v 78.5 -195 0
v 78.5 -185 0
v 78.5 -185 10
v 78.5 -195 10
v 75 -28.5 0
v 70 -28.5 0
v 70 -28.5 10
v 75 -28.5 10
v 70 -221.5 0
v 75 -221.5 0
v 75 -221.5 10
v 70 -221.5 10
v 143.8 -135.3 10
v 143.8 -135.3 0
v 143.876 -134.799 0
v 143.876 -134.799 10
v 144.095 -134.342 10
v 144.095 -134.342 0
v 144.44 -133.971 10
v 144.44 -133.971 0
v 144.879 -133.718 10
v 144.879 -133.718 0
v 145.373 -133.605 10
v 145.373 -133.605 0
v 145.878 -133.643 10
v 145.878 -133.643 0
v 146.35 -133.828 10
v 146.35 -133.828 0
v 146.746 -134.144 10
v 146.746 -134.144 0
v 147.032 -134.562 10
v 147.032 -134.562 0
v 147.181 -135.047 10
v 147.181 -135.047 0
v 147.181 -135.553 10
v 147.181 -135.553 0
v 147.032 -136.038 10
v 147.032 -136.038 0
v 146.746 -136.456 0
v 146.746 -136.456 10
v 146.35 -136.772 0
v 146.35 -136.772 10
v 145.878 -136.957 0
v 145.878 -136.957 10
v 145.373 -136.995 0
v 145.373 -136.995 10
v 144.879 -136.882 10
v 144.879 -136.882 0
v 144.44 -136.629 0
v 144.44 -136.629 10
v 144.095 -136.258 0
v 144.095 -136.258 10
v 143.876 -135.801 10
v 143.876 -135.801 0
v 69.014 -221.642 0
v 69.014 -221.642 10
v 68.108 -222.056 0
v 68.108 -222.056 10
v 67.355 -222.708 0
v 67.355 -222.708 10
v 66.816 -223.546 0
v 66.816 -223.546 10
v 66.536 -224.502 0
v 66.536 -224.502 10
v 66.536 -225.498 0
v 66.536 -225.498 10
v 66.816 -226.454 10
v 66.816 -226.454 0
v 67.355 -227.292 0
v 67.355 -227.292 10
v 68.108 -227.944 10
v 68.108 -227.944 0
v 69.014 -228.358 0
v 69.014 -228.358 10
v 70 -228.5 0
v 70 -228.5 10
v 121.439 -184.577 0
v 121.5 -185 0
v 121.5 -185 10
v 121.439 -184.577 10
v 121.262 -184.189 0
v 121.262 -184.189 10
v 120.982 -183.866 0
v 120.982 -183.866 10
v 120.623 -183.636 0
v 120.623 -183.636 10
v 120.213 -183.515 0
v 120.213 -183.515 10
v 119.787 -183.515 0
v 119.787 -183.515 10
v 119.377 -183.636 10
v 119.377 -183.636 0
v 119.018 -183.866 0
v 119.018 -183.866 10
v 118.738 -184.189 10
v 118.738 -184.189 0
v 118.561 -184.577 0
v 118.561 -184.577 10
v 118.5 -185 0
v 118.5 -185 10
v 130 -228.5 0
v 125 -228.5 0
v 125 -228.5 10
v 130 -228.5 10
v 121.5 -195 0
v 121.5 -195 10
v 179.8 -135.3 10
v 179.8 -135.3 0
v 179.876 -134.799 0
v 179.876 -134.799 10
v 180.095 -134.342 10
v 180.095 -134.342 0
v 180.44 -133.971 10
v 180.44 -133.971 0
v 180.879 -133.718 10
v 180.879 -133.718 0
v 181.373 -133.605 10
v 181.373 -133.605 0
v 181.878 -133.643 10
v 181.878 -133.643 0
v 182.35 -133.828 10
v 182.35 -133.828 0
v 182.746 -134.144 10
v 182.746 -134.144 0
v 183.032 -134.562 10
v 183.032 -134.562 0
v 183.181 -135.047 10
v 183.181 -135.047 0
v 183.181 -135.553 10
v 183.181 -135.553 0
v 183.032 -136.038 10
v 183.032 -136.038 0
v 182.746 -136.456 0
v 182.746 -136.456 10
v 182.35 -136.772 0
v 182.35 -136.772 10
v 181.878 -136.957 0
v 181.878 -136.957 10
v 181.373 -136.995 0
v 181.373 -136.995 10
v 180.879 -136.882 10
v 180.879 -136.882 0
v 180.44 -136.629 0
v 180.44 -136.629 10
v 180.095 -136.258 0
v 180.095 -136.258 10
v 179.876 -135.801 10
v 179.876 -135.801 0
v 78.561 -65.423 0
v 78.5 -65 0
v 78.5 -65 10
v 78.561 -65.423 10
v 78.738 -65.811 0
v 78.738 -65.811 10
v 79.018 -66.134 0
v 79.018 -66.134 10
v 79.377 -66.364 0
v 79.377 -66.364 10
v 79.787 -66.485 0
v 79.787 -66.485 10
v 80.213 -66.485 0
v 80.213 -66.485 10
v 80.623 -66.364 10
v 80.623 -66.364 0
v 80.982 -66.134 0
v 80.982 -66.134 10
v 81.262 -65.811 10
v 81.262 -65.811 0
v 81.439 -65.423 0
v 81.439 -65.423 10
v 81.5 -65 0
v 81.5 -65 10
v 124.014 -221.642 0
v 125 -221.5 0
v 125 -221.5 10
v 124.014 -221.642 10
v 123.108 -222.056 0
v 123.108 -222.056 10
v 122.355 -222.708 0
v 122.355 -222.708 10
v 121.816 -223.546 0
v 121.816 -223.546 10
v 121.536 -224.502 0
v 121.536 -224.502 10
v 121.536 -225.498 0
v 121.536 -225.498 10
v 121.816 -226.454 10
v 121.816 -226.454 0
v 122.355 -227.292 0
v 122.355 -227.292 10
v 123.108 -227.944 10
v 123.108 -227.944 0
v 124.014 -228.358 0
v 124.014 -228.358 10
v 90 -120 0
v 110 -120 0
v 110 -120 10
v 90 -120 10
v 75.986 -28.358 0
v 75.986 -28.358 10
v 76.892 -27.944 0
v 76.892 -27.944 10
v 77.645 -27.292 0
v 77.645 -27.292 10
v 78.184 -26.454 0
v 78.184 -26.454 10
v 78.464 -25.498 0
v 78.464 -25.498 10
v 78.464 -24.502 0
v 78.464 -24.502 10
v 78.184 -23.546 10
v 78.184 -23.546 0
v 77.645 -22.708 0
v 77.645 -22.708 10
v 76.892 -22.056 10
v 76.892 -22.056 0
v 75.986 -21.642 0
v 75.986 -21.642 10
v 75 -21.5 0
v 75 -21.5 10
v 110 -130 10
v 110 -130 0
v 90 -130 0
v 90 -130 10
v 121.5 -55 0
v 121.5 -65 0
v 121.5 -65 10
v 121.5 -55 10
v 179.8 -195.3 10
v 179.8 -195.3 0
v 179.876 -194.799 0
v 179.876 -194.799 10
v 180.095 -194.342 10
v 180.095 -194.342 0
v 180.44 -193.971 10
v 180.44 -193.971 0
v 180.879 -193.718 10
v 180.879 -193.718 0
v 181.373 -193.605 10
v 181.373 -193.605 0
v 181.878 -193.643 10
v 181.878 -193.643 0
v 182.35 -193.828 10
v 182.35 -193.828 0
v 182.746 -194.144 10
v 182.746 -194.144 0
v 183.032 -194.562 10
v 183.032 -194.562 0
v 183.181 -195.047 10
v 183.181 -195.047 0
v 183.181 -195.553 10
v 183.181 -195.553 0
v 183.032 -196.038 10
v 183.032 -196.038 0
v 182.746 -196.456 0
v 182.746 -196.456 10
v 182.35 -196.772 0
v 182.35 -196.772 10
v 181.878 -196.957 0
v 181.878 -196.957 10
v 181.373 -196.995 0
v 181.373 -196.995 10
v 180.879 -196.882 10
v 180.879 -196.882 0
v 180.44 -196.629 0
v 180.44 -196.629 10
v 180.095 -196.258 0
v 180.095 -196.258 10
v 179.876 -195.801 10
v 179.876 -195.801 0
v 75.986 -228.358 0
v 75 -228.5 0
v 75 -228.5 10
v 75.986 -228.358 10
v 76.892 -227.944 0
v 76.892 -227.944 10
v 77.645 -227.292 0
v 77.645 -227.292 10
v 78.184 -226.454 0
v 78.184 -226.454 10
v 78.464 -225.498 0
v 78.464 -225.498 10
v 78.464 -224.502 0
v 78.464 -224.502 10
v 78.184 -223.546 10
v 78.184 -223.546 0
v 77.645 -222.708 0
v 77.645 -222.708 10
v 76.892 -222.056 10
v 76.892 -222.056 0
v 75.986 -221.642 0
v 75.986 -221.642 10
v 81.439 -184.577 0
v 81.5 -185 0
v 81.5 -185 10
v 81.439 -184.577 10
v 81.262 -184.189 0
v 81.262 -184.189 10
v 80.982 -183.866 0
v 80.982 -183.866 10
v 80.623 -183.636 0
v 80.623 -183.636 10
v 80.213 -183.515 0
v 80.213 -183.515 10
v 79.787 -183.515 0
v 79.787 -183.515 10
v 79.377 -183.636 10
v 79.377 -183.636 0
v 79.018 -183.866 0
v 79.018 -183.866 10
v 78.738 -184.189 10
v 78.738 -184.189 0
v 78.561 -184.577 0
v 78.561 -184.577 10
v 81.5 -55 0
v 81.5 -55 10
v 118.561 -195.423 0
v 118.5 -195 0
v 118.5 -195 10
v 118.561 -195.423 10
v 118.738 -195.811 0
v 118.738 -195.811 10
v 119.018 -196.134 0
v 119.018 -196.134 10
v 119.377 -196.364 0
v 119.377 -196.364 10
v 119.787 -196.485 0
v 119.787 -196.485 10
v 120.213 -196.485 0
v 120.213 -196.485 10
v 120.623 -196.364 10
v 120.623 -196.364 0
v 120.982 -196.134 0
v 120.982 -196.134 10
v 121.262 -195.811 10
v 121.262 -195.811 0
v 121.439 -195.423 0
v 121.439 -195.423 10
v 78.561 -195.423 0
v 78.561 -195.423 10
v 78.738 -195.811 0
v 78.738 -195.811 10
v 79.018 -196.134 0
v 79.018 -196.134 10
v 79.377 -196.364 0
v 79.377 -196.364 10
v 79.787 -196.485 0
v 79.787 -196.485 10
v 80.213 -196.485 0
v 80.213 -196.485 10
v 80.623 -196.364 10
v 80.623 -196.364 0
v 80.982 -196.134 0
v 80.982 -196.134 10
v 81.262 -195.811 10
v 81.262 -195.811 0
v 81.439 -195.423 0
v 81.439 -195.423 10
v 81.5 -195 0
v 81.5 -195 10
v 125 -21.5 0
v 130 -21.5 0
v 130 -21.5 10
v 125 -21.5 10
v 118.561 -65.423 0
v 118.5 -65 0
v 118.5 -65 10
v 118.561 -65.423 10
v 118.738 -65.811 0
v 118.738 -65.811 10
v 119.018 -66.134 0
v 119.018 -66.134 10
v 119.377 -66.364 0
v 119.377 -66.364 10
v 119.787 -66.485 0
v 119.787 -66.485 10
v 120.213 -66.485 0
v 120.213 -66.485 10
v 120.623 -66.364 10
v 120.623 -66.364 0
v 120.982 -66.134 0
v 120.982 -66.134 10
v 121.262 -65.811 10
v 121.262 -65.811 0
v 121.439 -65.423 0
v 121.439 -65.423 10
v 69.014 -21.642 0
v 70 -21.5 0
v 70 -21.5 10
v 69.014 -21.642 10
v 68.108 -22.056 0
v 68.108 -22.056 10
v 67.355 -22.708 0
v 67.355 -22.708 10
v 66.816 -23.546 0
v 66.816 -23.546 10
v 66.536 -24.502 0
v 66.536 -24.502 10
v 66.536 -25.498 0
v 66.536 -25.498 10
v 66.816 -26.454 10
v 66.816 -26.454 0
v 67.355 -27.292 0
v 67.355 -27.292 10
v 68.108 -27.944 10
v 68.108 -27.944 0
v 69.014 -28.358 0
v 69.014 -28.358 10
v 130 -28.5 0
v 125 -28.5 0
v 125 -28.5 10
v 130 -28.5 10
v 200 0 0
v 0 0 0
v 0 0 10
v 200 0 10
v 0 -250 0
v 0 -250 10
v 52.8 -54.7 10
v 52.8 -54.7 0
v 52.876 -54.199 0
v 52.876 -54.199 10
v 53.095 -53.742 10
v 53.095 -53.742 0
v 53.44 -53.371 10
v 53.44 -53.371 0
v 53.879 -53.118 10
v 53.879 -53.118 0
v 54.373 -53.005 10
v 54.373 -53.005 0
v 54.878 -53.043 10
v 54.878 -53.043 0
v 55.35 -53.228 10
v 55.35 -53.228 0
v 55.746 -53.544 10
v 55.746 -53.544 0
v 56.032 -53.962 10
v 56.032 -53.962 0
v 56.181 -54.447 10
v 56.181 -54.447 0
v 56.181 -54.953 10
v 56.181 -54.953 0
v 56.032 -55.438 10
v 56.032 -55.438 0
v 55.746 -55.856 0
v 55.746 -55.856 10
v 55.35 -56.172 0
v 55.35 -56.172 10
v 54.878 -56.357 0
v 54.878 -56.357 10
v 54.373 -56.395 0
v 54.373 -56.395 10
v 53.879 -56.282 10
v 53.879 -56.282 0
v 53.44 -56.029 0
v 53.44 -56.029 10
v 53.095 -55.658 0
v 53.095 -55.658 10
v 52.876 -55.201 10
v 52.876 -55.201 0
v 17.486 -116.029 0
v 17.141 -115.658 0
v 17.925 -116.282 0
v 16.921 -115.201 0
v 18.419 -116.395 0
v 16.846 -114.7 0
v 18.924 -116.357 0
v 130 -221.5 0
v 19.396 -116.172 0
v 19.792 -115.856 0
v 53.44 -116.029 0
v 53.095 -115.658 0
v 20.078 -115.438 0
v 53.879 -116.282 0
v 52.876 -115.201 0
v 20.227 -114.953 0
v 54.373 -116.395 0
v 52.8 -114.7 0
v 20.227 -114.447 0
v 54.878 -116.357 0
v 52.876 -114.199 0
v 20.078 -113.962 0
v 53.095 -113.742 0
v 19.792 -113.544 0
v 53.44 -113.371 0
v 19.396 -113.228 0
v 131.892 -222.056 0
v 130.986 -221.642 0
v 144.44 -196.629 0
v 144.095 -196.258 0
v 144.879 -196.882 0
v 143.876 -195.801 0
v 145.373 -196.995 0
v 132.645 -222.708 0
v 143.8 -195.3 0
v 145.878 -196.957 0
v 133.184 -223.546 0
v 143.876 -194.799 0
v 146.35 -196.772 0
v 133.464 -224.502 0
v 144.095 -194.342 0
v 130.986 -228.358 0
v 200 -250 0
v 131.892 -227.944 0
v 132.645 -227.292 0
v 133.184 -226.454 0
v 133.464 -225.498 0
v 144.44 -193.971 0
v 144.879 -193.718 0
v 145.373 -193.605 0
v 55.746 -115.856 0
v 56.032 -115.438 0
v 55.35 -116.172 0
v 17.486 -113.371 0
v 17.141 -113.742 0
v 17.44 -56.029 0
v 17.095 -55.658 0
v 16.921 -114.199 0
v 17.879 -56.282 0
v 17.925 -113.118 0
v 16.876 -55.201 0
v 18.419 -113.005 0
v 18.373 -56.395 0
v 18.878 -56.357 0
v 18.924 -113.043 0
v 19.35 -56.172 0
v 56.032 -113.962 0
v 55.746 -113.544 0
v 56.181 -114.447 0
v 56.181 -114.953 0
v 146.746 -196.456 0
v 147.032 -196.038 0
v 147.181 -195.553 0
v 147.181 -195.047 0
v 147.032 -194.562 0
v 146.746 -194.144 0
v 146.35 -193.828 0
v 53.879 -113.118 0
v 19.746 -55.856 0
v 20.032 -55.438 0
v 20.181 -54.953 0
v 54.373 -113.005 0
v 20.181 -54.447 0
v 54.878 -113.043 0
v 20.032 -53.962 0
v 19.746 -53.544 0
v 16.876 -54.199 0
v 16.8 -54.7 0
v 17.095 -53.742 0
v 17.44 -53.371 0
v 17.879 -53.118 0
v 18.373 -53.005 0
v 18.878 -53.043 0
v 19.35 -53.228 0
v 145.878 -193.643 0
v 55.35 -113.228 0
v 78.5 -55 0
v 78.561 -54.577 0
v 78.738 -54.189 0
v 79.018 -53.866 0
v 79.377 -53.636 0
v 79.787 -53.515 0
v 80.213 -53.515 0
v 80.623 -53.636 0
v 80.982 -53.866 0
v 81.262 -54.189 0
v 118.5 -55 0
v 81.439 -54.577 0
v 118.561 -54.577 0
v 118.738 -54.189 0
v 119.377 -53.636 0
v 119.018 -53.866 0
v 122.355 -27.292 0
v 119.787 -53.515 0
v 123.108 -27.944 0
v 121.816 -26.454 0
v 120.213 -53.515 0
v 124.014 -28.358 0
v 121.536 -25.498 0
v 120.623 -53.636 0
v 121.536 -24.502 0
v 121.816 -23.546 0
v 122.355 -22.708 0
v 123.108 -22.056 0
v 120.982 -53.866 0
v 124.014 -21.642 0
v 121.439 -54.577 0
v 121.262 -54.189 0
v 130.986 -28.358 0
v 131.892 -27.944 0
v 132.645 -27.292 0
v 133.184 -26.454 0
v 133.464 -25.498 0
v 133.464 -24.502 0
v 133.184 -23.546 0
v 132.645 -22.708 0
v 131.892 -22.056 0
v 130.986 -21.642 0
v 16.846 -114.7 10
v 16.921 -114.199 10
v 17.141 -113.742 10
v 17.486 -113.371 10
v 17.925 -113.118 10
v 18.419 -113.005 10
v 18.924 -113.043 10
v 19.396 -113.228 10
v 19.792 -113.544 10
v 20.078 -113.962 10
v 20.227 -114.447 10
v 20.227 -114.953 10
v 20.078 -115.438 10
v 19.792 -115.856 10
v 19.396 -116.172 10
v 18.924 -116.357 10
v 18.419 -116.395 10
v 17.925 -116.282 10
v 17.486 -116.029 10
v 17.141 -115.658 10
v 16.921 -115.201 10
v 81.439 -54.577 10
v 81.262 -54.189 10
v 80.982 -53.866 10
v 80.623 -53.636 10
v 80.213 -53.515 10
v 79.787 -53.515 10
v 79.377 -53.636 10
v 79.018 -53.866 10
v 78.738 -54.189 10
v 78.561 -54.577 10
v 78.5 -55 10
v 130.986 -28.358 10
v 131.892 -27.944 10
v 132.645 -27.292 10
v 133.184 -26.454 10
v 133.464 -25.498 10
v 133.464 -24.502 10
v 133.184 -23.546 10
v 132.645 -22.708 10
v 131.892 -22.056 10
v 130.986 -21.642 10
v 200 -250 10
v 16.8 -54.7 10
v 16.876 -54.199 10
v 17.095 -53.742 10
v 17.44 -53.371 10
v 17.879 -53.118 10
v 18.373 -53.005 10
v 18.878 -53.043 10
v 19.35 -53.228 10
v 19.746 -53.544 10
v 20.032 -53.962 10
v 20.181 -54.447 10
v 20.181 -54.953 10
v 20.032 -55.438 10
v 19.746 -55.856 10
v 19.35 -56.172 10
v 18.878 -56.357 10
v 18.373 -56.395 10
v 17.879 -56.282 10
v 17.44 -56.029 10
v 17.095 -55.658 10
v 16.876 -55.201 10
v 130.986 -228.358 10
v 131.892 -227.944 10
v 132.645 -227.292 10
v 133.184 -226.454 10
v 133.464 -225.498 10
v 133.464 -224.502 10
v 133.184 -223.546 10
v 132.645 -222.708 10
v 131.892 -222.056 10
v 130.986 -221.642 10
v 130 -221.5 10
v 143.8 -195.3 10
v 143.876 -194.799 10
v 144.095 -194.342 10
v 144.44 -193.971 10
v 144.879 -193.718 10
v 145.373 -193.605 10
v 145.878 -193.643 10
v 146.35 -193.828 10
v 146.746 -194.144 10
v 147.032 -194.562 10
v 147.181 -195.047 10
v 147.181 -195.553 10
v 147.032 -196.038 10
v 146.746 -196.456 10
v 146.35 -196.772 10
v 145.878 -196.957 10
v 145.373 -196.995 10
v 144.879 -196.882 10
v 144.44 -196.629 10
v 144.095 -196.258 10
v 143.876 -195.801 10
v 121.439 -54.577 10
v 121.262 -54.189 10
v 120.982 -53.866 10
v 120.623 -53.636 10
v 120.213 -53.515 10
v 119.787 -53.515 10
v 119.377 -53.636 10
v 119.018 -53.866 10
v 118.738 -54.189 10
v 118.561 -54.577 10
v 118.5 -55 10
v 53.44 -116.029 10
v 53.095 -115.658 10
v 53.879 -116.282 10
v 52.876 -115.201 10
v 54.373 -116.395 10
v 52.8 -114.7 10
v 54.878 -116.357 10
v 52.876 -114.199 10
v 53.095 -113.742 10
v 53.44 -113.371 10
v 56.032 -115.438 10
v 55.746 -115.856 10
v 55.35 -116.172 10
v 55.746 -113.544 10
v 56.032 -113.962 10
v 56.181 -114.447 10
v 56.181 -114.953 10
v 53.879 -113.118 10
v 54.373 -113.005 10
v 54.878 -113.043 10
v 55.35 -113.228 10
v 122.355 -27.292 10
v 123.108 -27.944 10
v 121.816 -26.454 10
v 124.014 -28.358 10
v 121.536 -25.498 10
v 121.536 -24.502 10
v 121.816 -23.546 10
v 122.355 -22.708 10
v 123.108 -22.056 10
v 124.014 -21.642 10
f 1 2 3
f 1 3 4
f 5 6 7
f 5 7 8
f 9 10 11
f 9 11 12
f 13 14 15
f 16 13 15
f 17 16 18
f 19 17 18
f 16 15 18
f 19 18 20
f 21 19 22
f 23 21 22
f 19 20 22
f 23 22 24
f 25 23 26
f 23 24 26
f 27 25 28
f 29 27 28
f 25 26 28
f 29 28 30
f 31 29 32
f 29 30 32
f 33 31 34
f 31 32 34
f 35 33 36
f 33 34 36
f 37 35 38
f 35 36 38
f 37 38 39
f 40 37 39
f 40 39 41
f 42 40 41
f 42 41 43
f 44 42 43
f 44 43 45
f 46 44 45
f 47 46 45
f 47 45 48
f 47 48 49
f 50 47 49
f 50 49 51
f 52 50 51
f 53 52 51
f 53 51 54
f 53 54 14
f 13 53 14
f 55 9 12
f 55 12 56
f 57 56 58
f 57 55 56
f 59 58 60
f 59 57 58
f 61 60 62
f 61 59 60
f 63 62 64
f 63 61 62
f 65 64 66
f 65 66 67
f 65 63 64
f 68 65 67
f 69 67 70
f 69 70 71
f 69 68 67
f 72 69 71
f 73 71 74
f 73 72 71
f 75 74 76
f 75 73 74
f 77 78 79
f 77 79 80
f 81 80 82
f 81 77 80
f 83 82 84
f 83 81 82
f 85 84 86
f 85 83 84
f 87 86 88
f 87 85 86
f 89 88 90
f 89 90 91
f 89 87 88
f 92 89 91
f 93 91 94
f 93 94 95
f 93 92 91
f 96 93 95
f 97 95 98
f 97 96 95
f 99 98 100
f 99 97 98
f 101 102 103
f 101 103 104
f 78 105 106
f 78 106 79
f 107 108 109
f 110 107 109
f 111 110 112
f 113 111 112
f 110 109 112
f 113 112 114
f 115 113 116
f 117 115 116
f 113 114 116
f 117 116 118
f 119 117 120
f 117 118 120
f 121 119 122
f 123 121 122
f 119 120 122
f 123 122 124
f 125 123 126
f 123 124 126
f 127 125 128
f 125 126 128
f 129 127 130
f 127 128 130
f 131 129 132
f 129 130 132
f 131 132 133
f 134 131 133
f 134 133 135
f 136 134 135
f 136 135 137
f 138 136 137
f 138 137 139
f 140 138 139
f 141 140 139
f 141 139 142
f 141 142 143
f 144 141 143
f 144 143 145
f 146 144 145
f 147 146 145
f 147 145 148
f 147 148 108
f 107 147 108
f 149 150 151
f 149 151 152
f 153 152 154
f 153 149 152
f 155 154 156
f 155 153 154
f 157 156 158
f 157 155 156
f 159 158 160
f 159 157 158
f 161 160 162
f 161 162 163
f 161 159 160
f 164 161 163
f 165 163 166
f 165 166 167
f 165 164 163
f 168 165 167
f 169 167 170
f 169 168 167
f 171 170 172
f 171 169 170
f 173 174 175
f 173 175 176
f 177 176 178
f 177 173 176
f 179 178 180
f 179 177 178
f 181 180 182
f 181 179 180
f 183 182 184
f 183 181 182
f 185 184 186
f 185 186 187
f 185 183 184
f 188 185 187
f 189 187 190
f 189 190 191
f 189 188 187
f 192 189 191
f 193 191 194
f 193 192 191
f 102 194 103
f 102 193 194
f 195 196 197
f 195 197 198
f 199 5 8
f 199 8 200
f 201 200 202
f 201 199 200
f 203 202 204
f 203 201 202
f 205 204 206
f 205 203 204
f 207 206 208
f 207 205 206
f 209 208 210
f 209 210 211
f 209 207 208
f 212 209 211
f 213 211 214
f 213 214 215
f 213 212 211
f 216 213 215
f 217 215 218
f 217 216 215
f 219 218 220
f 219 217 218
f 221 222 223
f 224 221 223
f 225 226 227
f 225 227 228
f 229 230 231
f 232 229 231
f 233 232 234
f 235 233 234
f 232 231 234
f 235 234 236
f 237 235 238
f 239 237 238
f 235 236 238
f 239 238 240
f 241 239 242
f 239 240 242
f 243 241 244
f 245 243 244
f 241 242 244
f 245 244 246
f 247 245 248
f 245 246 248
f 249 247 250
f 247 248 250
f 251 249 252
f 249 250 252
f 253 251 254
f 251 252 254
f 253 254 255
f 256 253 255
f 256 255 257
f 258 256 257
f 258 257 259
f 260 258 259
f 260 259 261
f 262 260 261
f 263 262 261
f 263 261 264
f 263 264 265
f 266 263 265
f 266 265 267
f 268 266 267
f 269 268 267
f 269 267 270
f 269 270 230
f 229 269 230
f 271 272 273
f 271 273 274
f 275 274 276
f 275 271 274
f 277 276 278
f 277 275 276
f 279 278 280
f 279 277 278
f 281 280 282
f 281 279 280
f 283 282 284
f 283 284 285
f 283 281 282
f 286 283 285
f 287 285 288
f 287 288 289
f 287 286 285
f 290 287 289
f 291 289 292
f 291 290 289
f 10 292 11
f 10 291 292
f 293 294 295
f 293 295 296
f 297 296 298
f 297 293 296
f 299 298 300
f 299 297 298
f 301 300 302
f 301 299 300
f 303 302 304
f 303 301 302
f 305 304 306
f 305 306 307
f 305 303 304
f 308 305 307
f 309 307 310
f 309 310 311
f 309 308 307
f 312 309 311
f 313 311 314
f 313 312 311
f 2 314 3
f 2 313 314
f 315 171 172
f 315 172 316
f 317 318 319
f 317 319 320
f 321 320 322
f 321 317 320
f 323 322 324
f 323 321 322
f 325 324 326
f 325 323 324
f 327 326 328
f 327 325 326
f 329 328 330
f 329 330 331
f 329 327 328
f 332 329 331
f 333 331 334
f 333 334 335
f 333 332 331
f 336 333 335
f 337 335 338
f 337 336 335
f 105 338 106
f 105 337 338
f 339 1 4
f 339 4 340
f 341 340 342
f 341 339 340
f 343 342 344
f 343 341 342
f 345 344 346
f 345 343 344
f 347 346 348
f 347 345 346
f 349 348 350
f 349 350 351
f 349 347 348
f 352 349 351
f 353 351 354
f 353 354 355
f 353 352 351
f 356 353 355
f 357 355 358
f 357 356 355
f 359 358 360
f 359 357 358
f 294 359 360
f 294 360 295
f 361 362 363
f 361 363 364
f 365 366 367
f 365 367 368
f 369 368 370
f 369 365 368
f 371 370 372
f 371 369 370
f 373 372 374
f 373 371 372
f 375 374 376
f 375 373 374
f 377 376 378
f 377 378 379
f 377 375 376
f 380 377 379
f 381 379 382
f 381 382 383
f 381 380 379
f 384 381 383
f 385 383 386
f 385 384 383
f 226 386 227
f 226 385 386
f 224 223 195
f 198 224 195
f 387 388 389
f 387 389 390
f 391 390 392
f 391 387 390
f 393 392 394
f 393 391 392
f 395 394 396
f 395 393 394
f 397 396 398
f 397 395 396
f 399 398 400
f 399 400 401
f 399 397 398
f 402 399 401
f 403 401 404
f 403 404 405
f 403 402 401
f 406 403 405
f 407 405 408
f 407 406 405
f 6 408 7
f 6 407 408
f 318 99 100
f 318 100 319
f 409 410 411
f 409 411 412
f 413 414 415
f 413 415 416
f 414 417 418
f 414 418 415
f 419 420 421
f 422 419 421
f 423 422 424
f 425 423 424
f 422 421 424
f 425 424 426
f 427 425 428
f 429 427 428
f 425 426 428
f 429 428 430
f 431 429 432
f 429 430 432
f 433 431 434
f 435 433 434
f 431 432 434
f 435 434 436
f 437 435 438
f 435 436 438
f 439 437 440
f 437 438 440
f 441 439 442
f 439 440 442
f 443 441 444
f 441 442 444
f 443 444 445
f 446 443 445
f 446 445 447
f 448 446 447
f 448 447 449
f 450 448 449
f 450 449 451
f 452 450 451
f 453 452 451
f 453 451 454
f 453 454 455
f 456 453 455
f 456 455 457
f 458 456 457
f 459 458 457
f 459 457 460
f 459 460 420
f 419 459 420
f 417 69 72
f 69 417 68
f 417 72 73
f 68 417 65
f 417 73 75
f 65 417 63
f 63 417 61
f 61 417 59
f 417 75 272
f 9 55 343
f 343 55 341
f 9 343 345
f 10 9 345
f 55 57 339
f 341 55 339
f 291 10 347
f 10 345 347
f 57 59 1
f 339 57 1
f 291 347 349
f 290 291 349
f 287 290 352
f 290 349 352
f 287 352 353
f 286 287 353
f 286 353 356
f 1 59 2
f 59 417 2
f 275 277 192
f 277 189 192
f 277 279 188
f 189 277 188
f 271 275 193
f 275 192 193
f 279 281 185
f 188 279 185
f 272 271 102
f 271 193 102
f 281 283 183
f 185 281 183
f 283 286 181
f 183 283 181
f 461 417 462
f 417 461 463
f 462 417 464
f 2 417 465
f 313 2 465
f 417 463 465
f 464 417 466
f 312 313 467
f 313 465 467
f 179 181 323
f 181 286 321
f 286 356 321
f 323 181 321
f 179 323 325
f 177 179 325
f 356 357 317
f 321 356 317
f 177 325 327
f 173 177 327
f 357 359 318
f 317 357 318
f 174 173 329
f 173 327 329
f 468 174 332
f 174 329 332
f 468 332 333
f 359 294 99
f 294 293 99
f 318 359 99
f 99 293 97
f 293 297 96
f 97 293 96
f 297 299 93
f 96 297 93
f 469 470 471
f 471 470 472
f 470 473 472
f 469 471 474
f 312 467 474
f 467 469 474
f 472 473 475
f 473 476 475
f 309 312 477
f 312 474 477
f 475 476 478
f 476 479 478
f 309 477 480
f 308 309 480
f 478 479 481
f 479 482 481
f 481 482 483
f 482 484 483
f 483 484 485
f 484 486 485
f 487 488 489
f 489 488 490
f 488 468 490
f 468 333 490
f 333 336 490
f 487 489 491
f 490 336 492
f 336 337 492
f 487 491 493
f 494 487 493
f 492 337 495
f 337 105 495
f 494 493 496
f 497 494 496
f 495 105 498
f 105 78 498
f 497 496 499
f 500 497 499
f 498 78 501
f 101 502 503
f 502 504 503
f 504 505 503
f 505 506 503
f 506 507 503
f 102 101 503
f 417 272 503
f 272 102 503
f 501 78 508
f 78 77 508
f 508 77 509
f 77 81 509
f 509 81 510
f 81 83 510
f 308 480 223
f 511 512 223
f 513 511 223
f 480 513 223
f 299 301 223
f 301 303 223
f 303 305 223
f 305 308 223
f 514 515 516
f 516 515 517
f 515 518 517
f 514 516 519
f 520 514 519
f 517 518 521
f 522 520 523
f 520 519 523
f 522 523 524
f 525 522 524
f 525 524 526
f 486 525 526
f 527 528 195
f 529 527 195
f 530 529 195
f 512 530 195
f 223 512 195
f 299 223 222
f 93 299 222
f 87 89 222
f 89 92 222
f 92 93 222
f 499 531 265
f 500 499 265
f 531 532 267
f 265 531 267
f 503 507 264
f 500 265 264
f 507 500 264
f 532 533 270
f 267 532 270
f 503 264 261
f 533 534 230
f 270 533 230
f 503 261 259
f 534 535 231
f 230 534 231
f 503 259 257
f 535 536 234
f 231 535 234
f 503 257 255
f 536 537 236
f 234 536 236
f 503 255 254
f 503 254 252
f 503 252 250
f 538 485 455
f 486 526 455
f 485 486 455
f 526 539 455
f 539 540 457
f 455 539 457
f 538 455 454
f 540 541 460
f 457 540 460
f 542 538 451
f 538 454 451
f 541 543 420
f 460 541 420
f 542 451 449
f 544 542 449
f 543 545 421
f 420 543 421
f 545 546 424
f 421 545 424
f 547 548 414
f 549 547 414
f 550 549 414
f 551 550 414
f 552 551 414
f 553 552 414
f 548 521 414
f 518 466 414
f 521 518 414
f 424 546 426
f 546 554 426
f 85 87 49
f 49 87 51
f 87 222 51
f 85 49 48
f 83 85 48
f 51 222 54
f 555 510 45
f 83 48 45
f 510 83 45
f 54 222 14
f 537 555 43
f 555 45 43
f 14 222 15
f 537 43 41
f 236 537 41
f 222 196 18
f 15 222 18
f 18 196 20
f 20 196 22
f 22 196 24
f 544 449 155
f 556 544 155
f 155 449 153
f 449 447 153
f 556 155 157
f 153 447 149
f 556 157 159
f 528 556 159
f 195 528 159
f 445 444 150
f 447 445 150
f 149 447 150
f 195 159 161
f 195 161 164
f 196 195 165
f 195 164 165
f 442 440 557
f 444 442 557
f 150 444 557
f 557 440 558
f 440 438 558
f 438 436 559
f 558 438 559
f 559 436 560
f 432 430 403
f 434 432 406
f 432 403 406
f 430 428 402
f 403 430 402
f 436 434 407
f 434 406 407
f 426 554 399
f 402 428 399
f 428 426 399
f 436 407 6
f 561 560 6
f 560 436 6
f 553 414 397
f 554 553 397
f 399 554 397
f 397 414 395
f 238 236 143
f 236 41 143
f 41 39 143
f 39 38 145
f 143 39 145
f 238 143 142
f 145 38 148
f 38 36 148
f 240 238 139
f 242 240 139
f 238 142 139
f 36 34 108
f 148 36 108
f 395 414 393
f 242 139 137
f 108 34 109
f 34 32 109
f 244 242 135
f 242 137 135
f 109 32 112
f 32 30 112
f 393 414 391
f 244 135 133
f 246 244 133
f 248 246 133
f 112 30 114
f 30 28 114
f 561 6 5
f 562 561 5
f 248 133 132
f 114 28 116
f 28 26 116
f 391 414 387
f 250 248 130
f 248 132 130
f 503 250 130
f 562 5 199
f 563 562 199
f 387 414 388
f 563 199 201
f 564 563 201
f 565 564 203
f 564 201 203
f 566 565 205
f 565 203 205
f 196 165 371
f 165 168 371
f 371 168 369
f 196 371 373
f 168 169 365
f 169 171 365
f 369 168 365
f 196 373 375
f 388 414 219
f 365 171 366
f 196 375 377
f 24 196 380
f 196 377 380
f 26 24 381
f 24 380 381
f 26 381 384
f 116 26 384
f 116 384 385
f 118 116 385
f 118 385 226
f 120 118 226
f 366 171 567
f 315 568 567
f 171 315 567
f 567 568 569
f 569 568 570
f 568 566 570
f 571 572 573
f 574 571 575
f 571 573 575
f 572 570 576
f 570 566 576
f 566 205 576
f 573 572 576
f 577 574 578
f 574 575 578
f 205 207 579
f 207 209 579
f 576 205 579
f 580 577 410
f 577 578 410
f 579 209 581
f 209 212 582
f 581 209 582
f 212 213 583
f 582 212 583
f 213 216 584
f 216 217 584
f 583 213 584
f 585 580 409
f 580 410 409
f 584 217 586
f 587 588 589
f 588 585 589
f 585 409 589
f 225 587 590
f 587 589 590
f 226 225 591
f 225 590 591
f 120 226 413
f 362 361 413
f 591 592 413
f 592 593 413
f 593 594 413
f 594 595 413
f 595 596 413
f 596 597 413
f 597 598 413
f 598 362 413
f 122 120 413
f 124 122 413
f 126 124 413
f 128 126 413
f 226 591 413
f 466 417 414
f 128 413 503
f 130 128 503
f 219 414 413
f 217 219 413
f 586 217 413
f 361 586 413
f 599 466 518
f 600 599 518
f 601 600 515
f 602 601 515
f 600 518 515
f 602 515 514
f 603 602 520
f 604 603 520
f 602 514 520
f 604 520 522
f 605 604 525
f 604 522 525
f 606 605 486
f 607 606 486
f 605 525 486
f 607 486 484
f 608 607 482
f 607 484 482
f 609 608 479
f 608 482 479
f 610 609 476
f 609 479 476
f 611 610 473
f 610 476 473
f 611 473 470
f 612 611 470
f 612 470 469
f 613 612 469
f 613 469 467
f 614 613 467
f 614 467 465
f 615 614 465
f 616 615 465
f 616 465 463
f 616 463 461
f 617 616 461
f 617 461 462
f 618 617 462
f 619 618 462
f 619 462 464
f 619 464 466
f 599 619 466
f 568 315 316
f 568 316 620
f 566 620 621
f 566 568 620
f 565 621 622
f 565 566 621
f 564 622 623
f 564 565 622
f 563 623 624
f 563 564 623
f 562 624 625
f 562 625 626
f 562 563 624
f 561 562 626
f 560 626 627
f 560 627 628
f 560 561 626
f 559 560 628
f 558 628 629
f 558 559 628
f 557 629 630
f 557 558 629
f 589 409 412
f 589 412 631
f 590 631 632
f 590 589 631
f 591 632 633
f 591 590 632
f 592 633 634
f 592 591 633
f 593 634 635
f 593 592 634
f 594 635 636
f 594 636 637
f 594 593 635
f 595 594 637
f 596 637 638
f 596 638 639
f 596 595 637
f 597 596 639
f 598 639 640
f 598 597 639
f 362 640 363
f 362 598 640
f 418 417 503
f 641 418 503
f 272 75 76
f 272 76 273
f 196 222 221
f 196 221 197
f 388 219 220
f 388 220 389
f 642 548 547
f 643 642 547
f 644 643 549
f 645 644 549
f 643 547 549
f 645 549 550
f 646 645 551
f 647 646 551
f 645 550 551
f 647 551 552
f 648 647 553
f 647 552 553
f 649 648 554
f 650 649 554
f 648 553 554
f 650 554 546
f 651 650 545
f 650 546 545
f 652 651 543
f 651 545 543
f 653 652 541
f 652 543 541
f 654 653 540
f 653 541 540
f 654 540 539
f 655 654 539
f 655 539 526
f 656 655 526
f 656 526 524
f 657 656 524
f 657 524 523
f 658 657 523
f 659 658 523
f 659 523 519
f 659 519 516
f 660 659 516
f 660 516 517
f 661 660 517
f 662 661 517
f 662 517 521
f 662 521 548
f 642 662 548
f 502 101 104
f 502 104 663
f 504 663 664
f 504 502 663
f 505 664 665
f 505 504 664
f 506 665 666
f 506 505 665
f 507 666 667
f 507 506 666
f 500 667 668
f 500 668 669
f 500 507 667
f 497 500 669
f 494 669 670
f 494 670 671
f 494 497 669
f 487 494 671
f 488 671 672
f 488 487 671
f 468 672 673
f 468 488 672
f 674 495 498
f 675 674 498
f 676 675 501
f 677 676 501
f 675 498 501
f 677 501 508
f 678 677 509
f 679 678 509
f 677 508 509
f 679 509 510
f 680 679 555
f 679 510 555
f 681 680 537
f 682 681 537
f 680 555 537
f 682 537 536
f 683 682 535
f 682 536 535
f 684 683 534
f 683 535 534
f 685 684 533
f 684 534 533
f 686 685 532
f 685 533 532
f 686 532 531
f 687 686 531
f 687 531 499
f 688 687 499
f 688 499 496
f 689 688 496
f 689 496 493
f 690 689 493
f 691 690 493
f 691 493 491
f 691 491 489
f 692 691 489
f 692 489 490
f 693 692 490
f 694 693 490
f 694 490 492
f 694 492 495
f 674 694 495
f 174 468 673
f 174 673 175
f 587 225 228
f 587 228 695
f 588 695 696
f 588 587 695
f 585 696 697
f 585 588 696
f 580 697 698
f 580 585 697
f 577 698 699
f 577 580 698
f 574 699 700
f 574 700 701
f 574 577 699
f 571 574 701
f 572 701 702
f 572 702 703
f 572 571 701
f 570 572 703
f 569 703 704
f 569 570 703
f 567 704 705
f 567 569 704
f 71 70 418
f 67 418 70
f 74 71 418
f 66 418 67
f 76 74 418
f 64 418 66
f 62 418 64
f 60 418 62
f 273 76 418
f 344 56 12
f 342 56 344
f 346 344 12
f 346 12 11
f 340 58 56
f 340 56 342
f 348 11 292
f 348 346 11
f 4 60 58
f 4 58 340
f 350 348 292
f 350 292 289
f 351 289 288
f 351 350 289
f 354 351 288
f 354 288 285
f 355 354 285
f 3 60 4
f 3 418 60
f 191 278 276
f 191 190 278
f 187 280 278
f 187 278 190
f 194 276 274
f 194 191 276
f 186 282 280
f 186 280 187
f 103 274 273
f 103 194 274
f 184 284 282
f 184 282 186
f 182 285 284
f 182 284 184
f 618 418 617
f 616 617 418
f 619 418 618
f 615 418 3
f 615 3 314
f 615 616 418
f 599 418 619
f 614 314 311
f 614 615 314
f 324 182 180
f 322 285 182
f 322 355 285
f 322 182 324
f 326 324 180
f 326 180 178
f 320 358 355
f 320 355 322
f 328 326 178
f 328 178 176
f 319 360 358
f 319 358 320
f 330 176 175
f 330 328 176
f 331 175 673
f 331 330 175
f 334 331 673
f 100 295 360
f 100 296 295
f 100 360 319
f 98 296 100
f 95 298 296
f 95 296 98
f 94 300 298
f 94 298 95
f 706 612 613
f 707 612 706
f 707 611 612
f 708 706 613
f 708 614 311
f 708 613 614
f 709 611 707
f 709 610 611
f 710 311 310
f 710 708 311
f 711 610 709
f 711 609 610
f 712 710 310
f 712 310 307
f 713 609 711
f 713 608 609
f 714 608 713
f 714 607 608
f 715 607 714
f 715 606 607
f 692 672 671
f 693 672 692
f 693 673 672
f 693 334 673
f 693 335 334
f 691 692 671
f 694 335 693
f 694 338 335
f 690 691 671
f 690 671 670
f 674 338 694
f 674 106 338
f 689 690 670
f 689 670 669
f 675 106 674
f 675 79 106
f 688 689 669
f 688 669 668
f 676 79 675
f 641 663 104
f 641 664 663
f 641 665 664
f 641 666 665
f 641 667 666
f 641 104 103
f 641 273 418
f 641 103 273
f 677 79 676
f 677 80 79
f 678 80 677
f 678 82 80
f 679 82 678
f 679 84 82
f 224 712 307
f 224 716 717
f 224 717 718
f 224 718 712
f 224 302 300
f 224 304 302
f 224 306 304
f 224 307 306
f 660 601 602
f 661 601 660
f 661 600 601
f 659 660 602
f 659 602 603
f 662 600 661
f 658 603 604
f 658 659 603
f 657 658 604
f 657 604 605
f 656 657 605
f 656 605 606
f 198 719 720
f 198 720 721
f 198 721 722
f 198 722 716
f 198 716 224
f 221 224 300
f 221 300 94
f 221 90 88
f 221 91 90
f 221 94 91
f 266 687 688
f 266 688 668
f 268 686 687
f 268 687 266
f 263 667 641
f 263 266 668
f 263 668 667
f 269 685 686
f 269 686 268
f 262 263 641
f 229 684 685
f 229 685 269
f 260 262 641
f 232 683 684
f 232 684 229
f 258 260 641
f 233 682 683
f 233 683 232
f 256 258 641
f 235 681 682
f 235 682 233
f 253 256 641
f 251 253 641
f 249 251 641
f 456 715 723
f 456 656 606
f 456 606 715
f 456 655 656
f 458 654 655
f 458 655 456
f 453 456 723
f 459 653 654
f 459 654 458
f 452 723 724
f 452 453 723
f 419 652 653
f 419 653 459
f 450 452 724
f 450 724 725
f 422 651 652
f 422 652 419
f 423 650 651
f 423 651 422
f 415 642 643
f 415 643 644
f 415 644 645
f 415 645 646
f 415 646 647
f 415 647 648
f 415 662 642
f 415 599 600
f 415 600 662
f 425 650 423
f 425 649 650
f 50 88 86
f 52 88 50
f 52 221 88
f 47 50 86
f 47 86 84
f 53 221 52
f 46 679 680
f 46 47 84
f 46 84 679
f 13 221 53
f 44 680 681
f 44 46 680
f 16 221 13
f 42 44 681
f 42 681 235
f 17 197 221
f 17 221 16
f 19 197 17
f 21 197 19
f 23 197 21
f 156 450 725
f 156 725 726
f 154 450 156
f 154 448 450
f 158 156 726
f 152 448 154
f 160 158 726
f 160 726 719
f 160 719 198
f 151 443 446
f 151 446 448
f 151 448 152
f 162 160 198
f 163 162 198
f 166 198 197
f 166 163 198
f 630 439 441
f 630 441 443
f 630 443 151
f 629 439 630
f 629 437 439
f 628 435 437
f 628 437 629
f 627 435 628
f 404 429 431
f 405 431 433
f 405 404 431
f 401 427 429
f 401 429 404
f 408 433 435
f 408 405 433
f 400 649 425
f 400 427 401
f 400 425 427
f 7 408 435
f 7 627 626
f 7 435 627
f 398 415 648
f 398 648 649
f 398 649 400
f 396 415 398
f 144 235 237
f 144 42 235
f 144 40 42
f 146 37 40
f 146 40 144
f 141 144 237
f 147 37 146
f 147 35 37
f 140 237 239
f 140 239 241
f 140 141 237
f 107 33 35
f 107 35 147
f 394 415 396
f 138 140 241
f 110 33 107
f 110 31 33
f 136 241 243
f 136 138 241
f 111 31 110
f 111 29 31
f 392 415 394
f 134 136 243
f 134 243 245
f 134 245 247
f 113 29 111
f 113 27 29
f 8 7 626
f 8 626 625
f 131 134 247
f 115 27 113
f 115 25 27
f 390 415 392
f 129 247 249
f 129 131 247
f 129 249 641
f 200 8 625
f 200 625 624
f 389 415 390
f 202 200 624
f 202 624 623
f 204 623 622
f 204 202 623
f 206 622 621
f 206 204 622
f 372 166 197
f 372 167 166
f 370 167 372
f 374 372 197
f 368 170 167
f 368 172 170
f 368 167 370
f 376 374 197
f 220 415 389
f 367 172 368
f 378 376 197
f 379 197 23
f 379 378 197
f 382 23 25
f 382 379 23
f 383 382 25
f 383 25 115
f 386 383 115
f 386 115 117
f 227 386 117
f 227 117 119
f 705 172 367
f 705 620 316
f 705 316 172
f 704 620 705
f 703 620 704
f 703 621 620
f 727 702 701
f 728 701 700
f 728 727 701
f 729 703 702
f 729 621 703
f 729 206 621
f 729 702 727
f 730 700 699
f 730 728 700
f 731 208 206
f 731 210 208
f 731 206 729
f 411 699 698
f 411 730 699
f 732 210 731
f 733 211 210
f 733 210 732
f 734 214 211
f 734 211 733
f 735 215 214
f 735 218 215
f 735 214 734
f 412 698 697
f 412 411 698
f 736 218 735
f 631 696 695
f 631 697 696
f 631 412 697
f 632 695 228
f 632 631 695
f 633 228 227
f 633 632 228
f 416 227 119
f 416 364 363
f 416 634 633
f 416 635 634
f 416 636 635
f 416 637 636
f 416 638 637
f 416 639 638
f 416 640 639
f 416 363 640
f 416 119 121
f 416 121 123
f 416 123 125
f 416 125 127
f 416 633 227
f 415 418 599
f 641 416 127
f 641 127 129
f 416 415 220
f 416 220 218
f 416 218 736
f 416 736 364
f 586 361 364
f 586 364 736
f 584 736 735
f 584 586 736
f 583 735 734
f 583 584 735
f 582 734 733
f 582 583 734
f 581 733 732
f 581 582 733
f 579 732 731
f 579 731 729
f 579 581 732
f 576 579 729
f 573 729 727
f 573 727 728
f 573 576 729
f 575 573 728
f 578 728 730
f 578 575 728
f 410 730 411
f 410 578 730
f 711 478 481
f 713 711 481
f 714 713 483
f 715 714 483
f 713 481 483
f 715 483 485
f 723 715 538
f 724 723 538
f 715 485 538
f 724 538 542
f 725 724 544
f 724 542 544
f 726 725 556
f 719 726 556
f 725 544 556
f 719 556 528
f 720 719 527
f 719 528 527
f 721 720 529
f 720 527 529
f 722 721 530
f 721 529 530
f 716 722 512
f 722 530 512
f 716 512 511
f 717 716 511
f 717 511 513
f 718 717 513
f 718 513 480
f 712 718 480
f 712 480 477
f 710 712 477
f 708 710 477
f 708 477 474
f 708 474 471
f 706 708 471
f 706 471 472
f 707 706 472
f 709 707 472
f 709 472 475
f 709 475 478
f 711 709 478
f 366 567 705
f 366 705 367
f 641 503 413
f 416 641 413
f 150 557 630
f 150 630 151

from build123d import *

# Parameters (mm, degrees)
ESQUISSE2_W             = 200
ESQUISSE2_H             = 250
BOSS_EXTRU_1_DEPTH      = 10
ESQUISSE7_W             = 20
ESQUISSE7_H             = 10
ENL_V_MAT_EXTRU_2_DEPTH = 10
ENL_V_MAT_EXTRU_3_DEPTH = 10
ENL_V_MAT_EXTRU_4_DEPTH = 10
D_GAGEMENT_M31_D        = 3.4


with BuildPart() as part:
    # Esquisse2 → Boss.-Extru.1 (new body)
    with BuildSketch(Plane.XY):
        with Locations((100, -125)):
            Rectangle(ESQUISSE2_W, ESQUISSE2_H)
    extrude(amount=BOSS_EXTRU_1_DEPTH)

    # Esquisse7 → Enlèv. mat.-Extru.2 (cut)
    with BuildSketch(Plane(origin=(0, 0, 0), x_dir=(-1, 0, 0), z_dir=(0, 0, -1))):
        with Locations((-100, -125)):
            Rectangle(ESQUISSE7_W, ESQUISSE7_H)
    extrude(amount=-ENL_V_MAT_EXTRU_2_DEPTH, mode=Mode.SUBTRACT)

    # Esquisse10 → Enlèv. mat.-Extru.3 (cut)
    with BuildSketch(Plane(origin=(0, 0, 0), x_dir=(-1, 0, 0), z_dir=(0, 0, -1))):
        with BuildLine():
            Line((-70, -28.5), (-75, -28.5))
            ThreePointArc((-75, -28.5), (-78.5, -25), (-75, -21.5))
            Line((-75, -21.5), (-70, -21.5))
            ThreePointArc((-70, -21.5), (-66.5, -25), (-70, -28.5))
        make_face()
        with BuildLine():
            Line((-70, -228.5), (-75, -228.5))
            ThreePointArc((-75, -228.5), (-78.5, -225), (-75, -221.5))
            Line((-75, -221.5), (-70, -221.5))
            ThreePointArc((-70, -221.5), (-66.5, -225), (-70, -228.5))
        make_face()
        with BuildLine():
            Line((-130, -221.5), (-125, -221.5))
            ThreePointArc((-125, -221.5), (-121.5, -225), (-125, -228.5))
            Line((-125, -228.5), (-130, -228.5))
            ThreePointArc((-130, -228.5), (-133.5, -225), (-130, -221.5))
        make_face()
        with BuildLine():
            Line((-130, -21.5), (-125, -21.5))
            ThreePointArc((-125, -21.5), (-121.5, -25), (-125, -28.5))
            Line((-125, -28.5), (-130, -28.5))
            ThreePointArc((-130, -28.5), (-133.5, -25), (-130, -21.5))
        make_face()
    extrude(amount=-ENL_V_MAT_EXTRU_3_DEPTH, mode=Mode.SUBTRACT)

    # Esquisse11 → Enlèv. mat.-Extru.4 (cut)
    with BuildSketch(Plane(origin=(0, 0, 0), x_dir=(-1, 0, 0), z_dir=(0, 0, -1))):
        with BuildLine():
            Line((-78.5, -55), (-78.5, -65))
            ThreePointArc((-78.5, -65), (-80, -66.5), (-81.5, -65))
            Line((-81.5, -65), (-81.5, -55))
            ThreePointArc((-81.5, -55), (-80, -53.5), (-78.5, -55))
        make_face()
        with BuildLine():
            Line((-118.5, -55), (-118.5, -65))
            ThreePointArc((-118.5, -65), (-120, -66.5), (-121.5, -65))
            Line((-121.5, -65), (-121.5, -55))
            ThreePointArc((-121.5, -55), (-120, -53.5), (-118.5, -55))
        make_face()
        with BuildLine():
            Line((-121.5, -195), (-121.5, -185))
            ThreePointArc((-121.5, -185), (-120, -183.5), (-118.5, -185))
            Line((-118.5, -185), (-118.5, -195))
            ThreePointArc((-118.5, -195), (-120, -196.5), (-121.5, -195))
        make_face()
        with BuildLine():
            Line((-81.5, -195), (-81.5, -185))
            ThreePointArc((-81.5, -185), (-80, -183.5), (-78.5, -185))
            Line((-78.5, -185), (-78.5, -195))
            ThreePointArc((-78.5, -195), (-80, -196.5), (-81.5, -195))
        make_face()
    extrude(amount=-ENL_V_MAT_EXTRU_4_DEPTH, mode=Mode.SUBTRACT)

    # Dégagement M31 (through all)
    with Locations(Plane.XY.offset(10)):
        with Locations((18.5, -54.7), (54.5, -54.7), (18.545923706, -114.7), (54.5, -114.7), (145.5, -135.3), (181.5, -135.3), (145.5, -195.3), (181.5, -195.3)):
            Hole(D_GAGEMENT_M31_D / 2)


solid = part.part
